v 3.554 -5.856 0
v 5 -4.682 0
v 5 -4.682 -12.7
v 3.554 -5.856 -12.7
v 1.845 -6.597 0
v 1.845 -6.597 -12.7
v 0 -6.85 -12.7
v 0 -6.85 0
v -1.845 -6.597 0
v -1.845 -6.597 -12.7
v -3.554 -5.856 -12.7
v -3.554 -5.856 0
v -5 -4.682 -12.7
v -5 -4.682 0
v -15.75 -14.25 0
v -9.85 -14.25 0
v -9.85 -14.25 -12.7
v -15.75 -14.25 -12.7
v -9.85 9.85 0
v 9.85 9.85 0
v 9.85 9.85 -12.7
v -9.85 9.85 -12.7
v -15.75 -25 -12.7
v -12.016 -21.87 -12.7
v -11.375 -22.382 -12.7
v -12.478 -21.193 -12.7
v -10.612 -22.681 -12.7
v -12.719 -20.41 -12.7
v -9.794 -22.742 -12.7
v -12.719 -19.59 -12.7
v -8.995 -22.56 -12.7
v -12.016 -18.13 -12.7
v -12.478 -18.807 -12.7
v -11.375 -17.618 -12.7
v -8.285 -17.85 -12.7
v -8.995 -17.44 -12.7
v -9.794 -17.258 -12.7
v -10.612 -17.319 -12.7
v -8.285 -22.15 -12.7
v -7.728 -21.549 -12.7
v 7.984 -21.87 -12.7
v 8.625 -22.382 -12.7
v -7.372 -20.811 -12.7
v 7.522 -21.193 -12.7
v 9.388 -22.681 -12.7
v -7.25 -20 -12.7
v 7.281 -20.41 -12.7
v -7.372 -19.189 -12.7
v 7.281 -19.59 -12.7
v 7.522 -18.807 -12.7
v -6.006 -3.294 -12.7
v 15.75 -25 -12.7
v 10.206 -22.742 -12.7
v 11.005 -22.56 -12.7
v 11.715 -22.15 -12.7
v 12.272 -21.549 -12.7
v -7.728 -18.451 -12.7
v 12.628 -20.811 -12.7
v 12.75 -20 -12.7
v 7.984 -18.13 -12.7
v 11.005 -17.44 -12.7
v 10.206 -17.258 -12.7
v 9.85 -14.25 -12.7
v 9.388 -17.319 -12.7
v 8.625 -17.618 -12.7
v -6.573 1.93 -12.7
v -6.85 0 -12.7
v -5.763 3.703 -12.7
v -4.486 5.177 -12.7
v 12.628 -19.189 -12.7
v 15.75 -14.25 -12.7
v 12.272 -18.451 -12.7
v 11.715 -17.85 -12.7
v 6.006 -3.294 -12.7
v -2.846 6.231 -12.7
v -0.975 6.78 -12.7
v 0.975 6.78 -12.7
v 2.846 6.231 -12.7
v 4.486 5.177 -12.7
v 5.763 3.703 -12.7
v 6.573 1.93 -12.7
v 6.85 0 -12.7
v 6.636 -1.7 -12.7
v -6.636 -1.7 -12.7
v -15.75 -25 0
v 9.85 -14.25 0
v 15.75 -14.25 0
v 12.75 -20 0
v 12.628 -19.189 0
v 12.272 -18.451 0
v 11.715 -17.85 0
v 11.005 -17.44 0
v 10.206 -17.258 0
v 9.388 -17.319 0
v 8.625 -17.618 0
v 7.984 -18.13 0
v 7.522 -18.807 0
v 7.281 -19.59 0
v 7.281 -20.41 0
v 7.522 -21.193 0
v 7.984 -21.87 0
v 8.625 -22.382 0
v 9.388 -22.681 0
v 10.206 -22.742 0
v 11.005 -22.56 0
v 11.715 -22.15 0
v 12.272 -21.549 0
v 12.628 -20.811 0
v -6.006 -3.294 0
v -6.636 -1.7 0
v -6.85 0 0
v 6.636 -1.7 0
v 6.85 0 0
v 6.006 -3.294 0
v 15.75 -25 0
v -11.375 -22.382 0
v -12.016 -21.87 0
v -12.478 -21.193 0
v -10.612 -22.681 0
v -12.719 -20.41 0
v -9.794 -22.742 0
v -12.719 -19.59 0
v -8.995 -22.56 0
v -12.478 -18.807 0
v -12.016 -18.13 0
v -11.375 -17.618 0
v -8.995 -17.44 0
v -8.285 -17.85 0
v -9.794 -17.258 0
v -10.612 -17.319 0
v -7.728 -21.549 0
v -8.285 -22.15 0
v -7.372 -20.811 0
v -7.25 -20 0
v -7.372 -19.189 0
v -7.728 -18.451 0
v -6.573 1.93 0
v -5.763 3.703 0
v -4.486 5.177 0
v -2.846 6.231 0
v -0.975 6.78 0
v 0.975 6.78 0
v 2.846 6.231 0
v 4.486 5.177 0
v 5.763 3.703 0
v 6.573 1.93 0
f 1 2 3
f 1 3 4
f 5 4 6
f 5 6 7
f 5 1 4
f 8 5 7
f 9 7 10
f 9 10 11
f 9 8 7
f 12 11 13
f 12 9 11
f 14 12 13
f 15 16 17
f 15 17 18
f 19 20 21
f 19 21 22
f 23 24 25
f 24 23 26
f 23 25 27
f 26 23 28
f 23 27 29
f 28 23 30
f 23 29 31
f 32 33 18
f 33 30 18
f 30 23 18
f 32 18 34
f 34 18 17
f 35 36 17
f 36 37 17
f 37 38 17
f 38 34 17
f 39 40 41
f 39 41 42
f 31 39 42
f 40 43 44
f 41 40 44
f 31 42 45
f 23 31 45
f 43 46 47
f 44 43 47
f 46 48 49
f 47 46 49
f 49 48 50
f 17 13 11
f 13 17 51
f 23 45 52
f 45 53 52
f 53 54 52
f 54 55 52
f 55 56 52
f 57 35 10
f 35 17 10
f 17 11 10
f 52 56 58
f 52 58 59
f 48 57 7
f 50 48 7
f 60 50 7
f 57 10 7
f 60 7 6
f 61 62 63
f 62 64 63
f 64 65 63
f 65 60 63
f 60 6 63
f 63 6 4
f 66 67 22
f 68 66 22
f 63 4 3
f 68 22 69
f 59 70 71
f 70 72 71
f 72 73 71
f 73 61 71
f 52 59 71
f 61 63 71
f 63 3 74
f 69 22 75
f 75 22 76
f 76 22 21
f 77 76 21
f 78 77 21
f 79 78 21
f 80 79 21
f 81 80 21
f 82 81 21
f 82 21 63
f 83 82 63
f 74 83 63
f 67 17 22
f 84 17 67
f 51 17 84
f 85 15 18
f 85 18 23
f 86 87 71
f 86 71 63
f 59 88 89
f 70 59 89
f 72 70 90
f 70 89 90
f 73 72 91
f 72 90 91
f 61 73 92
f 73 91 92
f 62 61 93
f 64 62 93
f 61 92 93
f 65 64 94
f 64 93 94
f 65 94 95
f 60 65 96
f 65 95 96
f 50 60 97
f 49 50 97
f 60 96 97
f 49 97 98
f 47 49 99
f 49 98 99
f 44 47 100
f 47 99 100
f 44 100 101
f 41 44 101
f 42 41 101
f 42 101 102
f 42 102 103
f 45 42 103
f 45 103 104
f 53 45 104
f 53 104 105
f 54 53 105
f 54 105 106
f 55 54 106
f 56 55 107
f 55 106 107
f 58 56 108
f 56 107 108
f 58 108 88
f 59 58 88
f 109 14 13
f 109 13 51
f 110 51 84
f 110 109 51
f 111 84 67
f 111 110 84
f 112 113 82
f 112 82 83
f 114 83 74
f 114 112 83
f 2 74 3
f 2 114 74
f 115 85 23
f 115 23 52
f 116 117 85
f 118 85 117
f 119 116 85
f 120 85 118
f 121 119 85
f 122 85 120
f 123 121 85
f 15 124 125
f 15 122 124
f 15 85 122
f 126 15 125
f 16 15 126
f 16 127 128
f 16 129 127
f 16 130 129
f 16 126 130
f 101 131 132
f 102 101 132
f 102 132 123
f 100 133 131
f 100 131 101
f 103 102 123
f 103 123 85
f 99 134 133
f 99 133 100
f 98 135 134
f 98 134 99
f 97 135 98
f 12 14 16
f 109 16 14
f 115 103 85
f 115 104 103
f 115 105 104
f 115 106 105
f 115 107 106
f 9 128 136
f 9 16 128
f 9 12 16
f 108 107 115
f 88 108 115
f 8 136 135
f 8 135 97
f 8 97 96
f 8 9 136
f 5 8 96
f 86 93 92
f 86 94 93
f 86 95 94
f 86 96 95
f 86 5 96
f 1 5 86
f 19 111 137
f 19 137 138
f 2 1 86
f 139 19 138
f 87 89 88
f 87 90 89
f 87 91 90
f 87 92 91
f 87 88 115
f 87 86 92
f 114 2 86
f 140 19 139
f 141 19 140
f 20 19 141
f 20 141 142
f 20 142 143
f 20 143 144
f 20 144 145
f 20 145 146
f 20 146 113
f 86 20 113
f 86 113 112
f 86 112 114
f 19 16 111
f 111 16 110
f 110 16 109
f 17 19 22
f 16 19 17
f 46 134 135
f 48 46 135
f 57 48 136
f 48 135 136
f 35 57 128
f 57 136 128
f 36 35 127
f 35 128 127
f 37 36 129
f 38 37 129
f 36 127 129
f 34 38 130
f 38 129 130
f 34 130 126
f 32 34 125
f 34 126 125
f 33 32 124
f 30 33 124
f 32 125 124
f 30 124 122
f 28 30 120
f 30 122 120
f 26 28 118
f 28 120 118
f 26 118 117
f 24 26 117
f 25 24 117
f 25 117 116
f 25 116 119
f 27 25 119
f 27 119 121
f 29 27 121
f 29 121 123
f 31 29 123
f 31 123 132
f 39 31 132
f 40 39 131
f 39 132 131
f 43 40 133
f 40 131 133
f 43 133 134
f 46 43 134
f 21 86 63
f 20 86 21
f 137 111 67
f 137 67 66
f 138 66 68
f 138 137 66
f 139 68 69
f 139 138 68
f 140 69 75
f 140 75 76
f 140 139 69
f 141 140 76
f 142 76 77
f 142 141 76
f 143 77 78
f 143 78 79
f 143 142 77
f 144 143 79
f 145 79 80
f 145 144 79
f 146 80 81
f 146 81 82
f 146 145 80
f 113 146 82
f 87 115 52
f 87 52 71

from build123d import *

# Parameters (mm, degrees)
F0_R     = 2.75
F0_W     = 1.85
F0_H     = 10.75
F0_W_2   = 10
F1_DEPTH = 12.7


# Not quite as in the source:
# - a length typed as a fraction of an inch, garbled in the dataset ("3 / 203.2 mm" for 3/8 in), is restored


with BuildPart() as f1:
    # F0 (on Top) → F1 (new body)
    with BuildSketch(Plane.XY):
        Polygon((-15.75, -14.25), (-15.75, -25), (-6.85, -25), (-6.85, -14.25), (-9.85, -14.25), align=None)
        with Locations((-10, -20)):
            Circle(F0_R, mode=Mode.SUBTRACT)
        with Locations((-5.925, -19.625)):
            Rectangle(F0_W, F0_H)
        with Locations((0, -19.625)):
            Rectangle(F0_W_2, F0_H)
        with BuildLine():
            Line((-9.85, -14.25), (-6.85, -14.25))
            Line((-6.85, -14.25), (-6.85, 0))
            ThreePointArc((-6.85, 0), (0, 6.85), (6.85, 0))
            Line((6.85, 0), (6.85, -14.25))
            Line((6.85, -14.25), (9.85, -14.25))
            Line((9.85, -14.25), (9.85, 9.85))
            Line((9.85, 9.85), (-9.85, 9.85))
            Line((-9.85, 9.85), (-9.85, -14.25))
        make_face()
        with Locations((5.925, -19.625)):
            Rectangle(F0_W, F0_H)
        Polygon((6.85, -14.25), (6.85, -25), (15.75, -25), (15.75, -14.25), (9.85, -14.25), align=None)
        with Locations((10, -20)):
            Circle(F0_R, mode=Mode.SUBTRACT)
        with BuildLine():
            Line((-6.85, 0), (-6.85, -14.25))
            Line((-6.85, -14.25), (-5, -14.25))
            Line((-5, -14.25), (-5, -4.6821469434))
            ThreePointArc((-5, -4.6821469434), (-6.3707338667, -2.5171908946), (-6.85, 0))
        make_face()
        with BuildLine():
            Line((5, -4.6821469434), (5, -14.25))
            Line((5, -14.25), (6.85, -14.25))
            Line((6.85, -14.25), (6.85, 0))
            ThreePointArc((6.85, 0), (6.3707338667, -2.5171908946), (5, -4.6821469434))
        make_face()
        with BuildLine():
            Line((-5, -4.6821469434), (-5, -14.25))
            Line((-5, -14.25), (5, -14.25))
            Line((5, -14.25), (5, -4.6821469434))
            ThreePointArc((5, -4.6821469434), (0, -6.85), (-5, -4.6821469434))
        make_face()
    extrude(amount=-F1_DEPTH)


solid = f1.part
